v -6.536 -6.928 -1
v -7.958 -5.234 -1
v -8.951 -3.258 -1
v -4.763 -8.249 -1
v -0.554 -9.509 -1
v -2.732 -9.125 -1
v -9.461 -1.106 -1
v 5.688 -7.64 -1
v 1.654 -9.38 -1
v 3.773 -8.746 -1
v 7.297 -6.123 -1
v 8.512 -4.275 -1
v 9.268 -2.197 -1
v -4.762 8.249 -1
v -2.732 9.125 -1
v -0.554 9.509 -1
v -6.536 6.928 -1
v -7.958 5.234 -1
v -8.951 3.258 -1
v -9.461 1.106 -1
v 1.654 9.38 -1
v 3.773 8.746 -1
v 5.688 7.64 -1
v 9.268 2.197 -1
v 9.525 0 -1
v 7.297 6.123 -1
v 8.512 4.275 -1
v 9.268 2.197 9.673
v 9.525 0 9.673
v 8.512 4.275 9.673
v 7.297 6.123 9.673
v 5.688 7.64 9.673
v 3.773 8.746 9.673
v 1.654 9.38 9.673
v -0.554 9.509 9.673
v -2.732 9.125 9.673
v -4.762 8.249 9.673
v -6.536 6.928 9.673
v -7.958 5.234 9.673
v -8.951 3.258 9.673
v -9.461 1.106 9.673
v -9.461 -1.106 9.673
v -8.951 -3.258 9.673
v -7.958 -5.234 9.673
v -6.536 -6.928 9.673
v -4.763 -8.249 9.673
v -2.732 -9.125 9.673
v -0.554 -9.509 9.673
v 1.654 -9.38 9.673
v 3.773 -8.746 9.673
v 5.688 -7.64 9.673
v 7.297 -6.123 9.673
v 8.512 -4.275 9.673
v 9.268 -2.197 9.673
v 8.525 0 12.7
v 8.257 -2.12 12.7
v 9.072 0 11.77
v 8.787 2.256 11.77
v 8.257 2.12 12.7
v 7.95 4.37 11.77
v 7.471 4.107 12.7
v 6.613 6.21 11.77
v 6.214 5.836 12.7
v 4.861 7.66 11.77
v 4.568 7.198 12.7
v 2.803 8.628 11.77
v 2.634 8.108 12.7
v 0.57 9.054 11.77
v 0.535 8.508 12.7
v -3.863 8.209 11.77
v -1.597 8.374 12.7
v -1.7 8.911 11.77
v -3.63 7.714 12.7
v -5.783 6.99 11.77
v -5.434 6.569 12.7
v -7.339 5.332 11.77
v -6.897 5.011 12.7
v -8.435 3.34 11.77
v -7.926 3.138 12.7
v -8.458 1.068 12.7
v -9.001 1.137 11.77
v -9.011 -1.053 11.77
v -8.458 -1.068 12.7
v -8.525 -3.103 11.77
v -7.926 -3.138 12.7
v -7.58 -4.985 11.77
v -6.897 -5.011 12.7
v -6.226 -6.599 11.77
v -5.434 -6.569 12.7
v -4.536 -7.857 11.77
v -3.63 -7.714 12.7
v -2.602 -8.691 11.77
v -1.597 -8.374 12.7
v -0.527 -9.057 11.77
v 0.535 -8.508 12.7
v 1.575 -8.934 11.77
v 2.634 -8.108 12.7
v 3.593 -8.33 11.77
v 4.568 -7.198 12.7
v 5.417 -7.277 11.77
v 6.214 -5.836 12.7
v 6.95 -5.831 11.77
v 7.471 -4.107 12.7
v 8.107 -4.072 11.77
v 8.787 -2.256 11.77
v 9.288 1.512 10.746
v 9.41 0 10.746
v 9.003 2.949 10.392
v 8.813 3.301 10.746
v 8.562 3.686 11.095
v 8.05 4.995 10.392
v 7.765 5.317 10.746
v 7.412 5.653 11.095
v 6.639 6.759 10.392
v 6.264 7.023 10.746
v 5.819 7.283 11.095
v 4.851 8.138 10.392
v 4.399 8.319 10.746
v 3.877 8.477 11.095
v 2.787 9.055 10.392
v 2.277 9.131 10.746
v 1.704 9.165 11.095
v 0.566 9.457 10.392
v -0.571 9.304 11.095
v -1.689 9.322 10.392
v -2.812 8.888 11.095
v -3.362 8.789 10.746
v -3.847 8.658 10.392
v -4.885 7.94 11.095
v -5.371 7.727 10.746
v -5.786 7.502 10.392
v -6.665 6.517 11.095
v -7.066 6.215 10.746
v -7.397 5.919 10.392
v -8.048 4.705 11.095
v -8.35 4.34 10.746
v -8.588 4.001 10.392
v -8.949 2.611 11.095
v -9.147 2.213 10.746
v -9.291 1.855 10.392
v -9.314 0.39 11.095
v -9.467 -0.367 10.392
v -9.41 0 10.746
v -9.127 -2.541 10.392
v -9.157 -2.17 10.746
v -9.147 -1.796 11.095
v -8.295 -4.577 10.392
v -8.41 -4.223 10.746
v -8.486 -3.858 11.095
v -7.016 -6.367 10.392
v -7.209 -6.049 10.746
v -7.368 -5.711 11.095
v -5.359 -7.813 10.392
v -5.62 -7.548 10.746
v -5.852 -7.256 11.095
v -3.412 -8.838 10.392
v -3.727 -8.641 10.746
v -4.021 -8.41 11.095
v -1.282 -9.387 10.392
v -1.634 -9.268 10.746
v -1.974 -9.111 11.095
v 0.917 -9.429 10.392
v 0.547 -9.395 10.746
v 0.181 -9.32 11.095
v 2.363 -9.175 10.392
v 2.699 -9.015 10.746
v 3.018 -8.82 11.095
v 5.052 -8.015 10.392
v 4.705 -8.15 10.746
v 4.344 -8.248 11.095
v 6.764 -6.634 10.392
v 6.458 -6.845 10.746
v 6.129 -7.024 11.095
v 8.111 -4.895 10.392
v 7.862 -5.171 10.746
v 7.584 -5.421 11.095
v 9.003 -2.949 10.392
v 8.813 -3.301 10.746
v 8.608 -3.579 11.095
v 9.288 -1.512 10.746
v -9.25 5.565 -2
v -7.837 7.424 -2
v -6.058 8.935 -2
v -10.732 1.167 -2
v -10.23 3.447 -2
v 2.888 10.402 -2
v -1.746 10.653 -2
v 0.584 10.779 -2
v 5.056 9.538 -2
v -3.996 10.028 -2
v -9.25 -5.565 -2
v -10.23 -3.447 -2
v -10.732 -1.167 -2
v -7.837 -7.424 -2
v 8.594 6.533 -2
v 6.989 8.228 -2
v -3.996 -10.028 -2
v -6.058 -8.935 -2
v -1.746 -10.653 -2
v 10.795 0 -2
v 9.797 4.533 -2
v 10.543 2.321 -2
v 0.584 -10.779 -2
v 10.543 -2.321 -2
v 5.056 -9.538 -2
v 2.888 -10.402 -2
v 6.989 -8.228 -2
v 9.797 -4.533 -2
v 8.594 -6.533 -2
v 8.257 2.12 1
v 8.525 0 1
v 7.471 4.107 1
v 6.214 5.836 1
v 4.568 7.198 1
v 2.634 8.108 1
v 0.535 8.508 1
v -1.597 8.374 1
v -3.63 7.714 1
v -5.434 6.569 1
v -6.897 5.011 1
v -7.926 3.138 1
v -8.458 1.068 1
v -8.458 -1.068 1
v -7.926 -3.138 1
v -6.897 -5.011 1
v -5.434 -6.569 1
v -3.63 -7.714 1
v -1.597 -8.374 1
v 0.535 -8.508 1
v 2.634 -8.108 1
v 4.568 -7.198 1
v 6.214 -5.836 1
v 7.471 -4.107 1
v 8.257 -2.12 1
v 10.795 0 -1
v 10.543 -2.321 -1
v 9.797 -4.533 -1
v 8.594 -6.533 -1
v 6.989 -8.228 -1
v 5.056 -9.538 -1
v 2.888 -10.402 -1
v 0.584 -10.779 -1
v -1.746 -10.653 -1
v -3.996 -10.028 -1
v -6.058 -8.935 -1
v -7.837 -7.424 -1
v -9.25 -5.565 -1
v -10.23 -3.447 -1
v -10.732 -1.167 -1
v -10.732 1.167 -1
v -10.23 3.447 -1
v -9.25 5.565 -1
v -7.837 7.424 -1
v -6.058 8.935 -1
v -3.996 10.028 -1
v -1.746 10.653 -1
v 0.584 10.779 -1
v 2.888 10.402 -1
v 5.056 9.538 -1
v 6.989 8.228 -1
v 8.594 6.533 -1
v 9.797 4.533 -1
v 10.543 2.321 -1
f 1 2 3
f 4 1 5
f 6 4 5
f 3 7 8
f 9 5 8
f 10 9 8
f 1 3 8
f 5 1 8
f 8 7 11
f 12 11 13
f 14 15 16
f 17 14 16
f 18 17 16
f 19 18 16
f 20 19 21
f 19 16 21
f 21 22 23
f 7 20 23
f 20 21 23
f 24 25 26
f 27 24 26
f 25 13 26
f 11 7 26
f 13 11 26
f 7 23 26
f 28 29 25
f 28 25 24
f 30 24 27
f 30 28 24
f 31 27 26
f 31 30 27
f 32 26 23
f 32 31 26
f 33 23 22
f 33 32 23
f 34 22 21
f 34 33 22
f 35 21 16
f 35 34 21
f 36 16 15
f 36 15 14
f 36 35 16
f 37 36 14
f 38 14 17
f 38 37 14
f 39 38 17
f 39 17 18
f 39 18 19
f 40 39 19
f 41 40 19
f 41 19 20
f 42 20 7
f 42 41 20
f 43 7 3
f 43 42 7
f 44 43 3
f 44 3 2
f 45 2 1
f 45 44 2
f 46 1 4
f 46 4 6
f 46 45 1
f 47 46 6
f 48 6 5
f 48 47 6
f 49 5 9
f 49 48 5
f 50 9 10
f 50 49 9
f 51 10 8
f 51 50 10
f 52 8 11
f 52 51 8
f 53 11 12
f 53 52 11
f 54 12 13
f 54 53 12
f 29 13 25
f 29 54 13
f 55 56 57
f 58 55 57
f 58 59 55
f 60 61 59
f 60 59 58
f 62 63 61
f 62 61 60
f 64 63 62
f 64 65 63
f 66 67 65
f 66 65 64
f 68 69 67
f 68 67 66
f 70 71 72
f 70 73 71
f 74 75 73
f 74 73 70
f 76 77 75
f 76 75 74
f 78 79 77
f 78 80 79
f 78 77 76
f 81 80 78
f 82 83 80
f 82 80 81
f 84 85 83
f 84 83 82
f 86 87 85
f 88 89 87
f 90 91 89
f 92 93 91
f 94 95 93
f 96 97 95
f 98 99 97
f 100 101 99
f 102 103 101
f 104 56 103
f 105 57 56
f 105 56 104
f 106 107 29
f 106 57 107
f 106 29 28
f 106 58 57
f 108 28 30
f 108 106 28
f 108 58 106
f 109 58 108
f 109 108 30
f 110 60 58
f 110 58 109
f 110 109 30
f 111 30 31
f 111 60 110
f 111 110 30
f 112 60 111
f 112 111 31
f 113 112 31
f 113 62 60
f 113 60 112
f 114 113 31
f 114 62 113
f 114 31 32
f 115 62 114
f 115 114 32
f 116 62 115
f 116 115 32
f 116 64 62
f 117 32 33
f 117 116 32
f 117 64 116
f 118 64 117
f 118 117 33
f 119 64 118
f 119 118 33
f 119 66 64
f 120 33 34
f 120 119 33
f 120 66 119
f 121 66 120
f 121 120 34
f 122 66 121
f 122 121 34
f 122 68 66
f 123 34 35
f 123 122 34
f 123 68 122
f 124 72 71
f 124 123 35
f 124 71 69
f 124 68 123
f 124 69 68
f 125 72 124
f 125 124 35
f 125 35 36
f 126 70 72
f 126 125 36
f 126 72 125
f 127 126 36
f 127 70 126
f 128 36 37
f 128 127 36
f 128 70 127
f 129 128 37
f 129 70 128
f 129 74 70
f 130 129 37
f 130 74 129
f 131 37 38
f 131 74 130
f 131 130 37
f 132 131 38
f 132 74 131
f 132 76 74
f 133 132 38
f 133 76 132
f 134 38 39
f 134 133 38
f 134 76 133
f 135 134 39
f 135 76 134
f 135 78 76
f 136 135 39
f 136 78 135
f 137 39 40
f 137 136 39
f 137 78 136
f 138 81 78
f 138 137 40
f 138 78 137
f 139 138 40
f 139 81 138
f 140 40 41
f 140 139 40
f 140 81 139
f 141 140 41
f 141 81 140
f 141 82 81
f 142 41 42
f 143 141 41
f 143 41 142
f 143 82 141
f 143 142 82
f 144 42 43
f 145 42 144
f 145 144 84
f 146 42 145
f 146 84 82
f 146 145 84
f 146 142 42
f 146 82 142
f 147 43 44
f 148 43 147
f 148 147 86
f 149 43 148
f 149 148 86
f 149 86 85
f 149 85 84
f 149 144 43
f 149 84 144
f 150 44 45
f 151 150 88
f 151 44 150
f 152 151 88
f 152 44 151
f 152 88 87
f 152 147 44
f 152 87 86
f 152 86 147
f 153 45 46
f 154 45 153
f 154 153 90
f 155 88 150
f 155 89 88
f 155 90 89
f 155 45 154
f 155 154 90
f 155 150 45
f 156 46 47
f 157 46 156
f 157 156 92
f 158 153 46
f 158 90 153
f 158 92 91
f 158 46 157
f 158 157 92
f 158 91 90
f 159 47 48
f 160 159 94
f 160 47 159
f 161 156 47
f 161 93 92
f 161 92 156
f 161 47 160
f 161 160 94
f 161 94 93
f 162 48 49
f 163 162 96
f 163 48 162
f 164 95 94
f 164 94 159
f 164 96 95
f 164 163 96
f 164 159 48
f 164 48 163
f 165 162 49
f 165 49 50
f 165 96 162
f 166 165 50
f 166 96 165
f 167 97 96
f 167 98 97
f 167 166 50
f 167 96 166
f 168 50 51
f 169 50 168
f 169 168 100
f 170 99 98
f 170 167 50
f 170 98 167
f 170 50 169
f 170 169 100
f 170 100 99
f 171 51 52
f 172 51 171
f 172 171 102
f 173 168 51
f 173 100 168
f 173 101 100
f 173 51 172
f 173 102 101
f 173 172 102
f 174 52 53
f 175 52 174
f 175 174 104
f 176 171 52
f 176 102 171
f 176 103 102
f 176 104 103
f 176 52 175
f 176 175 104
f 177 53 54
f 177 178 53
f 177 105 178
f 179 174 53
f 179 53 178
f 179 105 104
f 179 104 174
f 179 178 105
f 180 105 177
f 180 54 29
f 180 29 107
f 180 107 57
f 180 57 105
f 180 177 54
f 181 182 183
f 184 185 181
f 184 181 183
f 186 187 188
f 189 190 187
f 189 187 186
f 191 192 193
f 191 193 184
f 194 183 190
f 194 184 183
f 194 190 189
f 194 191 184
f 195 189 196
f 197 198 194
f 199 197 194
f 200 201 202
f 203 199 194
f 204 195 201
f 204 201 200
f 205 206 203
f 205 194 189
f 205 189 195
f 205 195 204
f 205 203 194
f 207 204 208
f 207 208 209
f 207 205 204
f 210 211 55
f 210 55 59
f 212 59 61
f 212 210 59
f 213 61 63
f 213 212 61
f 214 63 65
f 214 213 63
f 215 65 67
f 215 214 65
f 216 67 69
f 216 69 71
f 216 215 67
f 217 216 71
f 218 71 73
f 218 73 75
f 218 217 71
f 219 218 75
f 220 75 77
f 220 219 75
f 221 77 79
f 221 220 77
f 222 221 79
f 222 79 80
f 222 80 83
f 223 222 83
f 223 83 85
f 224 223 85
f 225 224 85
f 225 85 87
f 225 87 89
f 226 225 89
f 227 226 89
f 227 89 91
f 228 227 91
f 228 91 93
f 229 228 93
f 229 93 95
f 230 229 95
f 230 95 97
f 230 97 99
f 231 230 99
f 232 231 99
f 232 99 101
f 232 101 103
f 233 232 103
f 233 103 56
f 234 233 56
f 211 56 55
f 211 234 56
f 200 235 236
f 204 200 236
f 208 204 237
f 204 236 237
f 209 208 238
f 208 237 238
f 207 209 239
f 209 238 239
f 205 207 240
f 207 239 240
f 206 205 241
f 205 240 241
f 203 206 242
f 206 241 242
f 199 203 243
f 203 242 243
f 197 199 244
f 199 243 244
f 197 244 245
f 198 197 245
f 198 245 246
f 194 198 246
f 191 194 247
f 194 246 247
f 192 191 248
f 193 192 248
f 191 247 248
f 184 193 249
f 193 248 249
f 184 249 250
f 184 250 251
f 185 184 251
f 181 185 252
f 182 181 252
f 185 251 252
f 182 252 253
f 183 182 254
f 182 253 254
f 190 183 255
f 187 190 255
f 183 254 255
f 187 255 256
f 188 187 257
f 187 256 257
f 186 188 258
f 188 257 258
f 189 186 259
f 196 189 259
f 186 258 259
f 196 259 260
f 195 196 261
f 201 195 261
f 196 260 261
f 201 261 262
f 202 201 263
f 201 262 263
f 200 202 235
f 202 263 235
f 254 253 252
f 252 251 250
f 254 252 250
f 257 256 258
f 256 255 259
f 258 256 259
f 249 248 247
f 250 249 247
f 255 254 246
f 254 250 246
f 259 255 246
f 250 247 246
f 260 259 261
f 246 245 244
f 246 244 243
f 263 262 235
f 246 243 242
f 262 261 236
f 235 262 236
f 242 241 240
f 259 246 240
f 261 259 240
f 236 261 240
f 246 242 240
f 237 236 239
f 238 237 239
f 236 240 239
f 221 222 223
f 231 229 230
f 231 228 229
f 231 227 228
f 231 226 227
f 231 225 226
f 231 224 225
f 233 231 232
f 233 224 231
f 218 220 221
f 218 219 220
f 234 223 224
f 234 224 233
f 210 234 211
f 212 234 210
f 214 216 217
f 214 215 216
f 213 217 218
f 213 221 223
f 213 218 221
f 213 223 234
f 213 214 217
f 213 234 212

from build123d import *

# Parameters (mm, degrees)
F0_R     = 9.525
F1_DEPTH = 12.7
F2_T     = -1
F3_DEPTH = 1
F4_R     = 10.795
F4_R_2   = 9.525
F5_DEPTH = 1


# Not quite as in the source:
# - a fillet or chamfer that OpenCascade refuses, or shapes differently, is made with other operations: its cross-section is extruded or revolved along the edge and cut away or added


with BuildPart() as f1:
    # F0 (on Top) → F1 (new body)
    with BuildSketch(Plane.XY):
        Circle(F0_R)
    extrude(amount=F1_DEPTH)

    # F2
    f2_openings = [f1.faces().sort_by_distance(p)[0] for p in [
        (0, 0, 12.7),
    ]]
    offset(amount=F2_T, openings=f2_openings)

    # F3 (add): a face of the model
    f3_faces = [f1.faces().sort_by_distance(p)[0] for p in [
        (0, 0, 0),
    ]]
    extrude(f3_faces, amount=F3_DEPTH)

    # F6: fillet of radius 5.08 on 1 edges, made by hand

    # F6_s1 → F6_t2 (revolve, cut)
    with BuildSketch(Plane.XZ):
        with BuildLine():
            ThreePointArc((9.525, 9.6734508099), (9.2685256815, 11.267188555), (8.525, 12.7))
            Line((8.525, 12.7), (9.525, 12.7))
            Line((9.525, 12.7), (9.525, 9.6734508099))
        make_face()
    revolve(axis=Axis((0, 0, 12.7), (0, 0, 1)), mode=Mode.SUBTRACT)


with BuildPart() as f5:
    # F4 (on face) → F5 (new body)
    with BuildSketch(Plane(origin=(0, 0, -1), x_dir=(1, 0, 0), z_dir=(0, 0, -1))):
        Circle(F4_R)
        Circle(F4_R_2, mode=Mode.SUBTRACT)
        Circle(F4_R_2)
    extrude(amount=F5_DEPTH)


solid = Compound([f1.part, f5.part])
